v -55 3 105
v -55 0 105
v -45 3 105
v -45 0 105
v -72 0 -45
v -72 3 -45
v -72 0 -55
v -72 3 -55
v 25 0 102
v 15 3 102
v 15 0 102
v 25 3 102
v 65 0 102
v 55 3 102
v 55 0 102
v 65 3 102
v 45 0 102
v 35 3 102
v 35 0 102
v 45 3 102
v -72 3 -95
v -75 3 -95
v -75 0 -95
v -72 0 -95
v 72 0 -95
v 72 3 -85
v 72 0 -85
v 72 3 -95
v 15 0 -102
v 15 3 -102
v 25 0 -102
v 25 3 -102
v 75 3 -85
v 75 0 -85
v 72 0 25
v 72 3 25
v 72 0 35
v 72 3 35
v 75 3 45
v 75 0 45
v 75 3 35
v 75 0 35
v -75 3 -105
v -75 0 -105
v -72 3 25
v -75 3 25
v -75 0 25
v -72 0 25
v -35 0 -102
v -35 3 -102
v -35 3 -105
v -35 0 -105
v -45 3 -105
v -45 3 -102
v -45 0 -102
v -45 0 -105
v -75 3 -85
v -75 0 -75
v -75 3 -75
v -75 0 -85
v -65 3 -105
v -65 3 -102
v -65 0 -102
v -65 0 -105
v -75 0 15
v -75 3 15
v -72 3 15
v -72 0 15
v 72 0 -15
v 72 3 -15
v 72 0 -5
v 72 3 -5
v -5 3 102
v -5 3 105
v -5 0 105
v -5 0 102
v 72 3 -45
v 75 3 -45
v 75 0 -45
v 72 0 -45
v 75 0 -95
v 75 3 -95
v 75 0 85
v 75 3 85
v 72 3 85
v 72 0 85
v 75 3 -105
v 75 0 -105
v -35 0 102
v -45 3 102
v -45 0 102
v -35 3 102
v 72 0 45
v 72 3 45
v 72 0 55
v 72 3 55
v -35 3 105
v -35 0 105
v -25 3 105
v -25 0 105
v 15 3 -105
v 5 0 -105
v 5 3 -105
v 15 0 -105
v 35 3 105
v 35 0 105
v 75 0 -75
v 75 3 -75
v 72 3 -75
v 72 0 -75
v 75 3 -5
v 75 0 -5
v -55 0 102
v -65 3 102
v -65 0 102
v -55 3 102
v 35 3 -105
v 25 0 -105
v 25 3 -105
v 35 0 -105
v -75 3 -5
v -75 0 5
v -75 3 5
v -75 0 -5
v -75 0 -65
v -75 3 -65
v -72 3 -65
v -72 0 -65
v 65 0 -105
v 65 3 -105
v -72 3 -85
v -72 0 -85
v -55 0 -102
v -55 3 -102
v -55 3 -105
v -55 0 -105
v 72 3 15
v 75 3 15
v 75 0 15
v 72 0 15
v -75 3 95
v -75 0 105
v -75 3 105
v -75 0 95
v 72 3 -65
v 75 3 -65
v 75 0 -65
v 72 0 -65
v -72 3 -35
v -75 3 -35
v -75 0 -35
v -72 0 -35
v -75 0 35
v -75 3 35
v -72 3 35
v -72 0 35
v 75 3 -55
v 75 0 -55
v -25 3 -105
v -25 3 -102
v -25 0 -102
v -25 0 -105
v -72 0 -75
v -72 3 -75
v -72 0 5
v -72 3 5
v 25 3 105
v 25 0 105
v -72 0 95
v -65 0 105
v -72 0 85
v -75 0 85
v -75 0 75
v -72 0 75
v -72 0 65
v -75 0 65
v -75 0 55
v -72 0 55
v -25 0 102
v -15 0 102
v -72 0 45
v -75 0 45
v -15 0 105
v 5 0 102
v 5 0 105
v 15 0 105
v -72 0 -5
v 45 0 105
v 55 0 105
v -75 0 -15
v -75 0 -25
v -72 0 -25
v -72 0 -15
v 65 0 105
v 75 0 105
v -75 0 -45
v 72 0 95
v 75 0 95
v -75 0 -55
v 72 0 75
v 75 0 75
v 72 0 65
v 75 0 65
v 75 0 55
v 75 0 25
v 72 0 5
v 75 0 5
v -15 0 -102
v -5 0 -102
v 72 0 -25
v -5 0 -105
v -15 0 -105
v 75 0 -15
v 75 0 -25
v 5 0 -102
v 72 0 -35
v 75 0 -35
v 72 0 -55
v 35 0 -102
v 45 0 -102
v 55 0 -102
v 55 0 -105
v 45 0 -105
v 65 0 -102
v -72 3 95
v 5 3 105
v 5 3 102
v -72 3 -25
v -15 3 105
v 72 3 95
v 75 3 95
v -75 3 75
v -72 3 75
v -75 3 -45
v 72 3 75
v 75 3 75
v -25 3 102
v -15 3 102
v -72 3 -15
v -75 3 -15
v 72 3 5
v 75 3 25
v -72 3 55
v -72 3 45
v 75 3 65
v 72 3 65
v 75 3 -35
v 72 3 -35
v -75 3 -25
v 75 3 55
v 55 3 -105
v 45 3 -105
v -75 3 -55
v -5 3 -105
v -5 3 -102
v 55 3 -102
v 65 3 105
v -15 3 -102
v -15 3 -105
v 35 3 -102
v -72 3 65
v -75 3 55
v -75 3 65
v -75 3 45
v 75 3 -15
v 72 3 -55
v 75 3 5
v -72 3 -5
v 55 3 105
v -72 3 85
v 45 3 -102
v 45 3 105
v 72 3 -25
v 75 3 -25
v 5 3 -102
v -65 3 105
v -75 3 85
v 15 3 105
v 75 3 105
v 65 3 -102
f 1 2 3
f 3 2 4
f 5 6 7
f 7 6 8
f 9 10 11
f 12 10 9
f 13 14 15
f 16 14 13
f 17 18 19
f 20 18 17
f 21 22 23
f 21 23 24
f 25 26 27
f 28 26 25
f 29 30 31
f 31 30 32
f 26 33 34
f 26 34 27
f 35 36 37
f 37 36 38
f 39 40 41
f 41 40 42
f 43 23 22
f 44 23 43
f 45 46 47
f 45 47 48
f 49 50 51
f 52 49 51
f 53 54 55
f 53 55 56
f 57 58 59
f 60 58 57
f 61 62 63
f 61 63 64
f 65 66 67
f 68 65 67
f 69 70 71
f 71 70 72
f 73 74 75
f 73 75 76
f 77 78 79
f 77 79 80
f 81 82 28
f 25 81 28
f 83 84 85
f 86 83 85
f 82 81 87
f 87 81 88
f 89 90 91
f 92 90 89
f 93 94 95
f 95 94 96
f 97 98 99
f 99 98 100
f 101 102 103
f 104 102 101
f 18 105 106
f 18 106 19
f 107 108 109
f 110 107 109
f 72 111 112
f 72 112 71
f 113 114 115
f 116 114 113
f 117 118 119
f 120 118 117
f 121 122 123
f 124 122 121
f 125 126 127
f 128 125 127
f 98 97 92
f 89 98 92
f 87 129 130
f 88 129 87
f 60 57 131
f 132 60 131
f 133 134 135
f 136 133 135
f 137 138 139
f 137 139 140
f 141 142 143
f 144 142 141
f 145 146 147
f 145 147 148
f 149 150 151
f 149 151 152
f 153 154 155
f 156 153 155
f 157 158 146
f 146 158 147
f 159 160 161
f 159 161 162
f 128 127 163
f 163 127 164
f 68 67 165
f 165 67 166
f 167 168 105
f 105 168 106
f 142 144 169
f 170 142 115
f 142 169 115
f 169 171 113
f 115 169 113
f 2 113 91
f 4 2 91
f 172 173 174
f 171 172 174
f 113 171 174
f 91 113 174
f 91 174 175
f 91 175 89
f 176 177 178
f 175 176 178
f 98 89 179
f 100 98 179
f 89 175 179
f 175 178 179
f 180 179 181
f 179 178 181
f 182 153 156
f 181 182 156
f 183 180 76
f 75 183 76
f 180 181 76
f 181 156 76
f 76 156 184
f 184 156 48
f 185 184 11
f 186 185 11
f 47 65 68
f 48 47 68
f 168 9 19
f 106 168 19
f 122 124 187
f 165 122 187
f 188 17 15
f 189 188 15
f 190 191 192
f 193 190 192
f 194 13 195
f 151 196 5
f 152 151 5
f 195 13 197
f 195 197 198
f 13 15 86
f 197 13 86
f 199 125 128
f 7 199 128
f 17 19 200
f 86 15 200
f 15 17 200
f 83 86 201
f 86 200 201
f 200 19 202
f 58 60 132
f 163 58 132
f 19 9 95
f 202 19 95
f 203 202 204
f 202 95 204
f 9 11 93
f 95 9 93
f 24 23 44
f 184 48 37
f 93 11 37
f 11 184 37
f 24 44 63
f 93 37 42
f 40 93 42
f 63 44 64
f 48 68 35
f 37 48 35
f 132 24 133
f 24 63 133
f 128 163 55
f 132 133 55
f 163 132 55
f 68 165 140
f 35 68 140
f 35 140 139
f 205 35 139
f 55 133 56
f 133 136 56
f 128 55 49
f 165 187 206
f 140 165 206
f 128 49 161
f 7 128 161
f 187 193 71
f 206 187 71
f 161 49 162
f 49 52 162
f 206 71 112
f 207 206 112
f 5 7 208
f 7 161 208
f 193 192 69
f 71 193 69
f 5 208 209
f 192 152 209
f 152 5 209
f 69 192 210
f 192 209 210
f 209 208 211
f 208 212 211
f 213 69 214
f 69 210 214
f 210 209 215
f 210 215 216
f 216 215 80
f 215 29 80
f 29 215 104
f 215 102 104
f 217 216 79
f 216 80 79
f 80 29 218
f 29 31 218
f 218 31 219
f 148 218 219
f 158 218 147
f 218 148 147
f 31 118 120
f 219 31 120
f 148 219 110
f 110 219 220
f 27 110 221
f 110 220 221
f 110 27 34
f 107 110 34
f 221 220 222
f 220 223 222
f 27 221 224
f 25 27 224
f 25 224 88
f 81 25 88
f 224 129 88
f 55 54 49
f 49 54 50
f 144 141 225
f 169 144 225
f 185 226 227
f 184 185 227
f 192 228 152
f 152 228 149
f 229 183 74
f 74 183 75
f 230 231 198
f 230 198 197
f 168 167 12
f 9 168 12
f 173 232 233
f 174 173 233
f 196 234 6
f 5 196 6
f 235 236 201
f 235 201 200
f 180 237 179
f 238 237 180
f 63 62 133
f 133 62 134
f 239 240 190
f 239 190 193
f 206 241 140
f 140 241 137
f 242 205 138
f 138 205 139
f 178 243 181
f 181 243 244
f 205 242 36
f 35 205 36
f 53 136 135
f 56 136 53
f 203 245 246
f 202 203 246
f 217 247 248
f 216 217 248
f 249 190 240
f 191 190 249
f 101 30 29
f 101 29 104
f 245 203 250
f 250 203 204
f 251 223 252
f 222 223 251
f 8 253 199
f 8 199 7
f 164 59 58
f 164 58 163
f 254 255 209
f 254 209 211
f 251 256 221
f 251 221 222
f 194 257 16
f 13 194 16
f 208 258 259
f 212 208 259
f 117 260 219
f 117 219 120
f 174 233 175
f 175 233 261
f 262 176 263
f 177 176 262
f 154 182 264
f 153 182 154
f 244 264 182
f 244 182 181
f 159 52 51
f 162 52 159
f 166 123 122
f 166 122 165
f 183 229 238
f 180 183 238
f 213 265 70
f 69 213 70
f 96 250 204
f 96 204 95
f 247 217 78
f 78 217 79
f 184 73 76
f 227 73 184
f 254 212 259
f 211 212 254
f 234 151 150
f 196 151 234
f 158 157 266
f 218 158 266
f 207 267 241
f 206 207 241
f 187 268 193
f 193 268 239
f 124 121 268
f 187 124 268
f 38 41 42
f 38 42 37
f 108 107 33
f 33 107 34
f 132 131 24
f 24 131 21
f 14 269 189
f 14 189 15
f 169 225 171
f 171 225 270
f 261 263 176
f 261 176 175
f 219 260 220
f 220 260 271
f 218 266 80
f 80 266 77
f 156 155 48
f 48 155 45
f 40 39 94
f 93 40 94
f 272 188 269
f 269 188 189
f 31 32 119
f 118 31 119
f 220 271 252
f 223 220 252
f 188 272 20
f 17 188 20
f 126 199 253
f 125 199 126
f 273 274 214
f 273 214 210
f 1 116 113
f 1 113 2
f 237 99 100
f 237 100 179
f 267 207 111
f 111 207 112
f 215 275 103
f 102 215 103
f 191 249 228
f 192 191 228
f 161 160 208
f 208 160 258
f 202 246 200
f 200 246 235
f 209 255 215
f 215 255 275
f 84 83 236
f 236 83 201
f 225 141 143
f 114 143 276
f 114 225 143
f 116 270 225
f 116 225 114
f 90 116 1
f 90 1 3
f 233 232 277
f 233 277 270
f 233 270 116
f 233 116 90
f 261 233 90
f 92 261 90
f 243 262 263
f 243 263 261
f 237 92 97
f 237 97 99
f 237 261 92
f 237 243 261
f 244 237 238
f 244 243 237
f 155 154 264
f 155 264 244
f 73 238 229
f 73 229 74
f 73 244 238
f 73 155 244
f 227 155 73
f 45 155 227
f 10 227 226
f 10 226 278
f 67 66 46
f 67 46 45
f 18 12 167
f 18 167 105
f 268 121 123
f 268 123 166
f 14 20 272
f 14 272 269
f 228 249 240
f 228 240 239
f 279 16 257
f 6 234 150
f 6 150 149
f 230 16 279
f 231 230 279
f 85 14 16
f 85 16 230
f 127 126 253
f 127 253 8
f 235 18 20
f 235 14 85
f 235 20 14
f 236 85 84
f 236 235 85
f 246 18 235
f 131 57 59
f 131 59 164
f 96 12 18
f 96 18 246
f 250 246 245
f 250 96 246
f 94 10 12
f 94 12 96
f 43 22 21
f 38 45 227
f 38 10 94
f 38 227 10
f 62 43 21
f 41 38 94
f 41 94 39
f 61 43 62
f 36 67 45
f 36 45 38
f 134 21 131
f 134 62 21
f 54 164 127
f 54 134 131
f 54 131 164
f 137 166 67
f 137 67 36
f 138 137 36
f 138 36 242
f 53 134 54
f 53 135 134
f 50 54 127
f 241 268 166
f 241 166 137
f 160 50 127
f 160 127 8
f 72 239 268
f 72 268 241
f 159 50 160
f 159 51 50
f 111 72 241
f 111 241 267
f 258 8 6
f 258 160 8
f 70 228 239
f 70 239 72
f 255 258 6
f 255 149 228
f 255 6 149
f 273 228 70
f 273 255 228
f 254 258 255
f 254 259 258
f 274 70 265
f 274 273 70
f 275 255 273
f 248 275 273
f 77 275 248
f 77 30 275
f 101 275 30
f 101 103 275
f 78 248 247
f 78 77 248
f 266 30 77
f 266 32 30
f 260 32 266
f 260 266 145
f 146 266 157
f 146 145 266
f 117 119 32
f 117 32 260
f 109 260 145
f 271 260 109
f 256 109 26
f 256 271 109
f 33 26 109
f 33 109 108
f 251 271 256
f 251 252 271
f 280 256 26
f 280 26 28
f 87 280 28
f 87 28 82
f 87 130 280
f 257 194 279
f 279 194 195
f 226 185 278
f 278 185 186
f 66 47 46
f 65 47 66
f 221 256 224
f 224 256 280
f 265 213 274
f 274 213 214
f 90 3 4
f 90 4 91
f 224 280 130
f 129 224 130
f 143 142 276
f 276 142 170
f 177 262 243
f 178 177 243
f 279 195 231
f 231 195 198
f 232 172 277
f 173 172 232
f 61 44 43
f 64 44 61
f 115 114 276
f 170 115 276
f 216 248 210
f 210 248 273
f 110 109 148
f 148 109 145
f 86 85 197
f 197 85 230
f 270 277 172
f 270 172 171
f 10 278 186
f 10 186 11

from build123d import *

# Parameters (mm, degrees)
SKETCH1_W               = 150
SKETCH1_H               = 210
BOSS_EXTRUDE1_DEPTH     = 3
SKETCH2_W               = 10
SKETCH2_H               = 3
CUT_EXTRUDE1_DEPTH      = 3
LPATTERN1_COUNT         = 7
LPATTERN1_PITCH         = 20
MIRROR1_COPY_1_SKETCH_W = 10
MIRROR1_COPY_1_SKETCH_H = 3
MIRROR1_COPY_1_DEPTH    = 3
MIRROR1_COPY_2_SKETCH_W = 10
MIRROR1_COPY_2_SKETCH_H = 3
MIRROR1_COPY_2_DEPTH    = 3
MIRROR1_COPY_3_SKETCH_W = 10
MIRROR1_COPY_3_SKETCH_H = 3
MIRROR1_COPY_3_DEPTH    = 3
MIRROR1_COPY_4_SKETCH_W = 10
MIRROR1_COPY_4_SKETCH_H = 3
MIRROR1_COPY_4_DEPTH    = 3
MIRROR1_COPY_5_SKETCH_W = 10
MIRROR1_COPY_5_SKETCH_H = 3
MIRROR1_COPY_5_DEPTH    = 3
MIRROR1_COPY_6_SKETCH_W = 10
MIRROR1_COPY_6_SKETCH_H = 3
MIRROR1_COPY_6_DEPTH    = 3
SKETCH4_W               = 3
SKETCH4_H               = 10
CUT_EXTRUDE2_DEPTH      = 3
LPATTERN2_COUNT         = 10
LPATTERN2_PITCH         = 20
MIRROR2_COPY_1_SKETCH_W = 3
MIRROR2_COPY_1_SKETCH_H = 10
MIRROR2_COPY_1_DEPTH    = 3
MIRROR2_COPY_2_SKETCH_W = 3
MIRROR2_COPY_2_SKETCH_H = 10
MIRROR2_COPY_2_DEPTH    = 3
MIRROR2_COPY_3_SKETCH_W = 3
MIRROR2_COPY_3_SKETCH_H = 10
MIRROR2_COPY_3_DEPTH    = 3
MIRROR2_COPY_4_SKETCH_W = 3
MIRROR2_COPY_4_SKETCH_H = 10
MIRROR2_COPY_4_DEPTH    = 3
MIRROR2_COPY_5_SKETCH_W = 3
MIRROR2_COPY_5_SKETCH_H = 10
MIRROR2_COPY_5_DEPTH    = 3
MIRROR2_COPY_6_SKETCH_W = 3
MIRROR2_COPY_6_SKETCH_H = 10
MIRROR2_COPY_6_DEPTH    = 3
MIRROR2_COPY_7_SKETCH_W = 3
MIRROR2_COPY_7_SKETCH_H = 10
MIRROR2_COPY_7_DEPTH    = 3
MIRROR2_COPY_8_SKETCH_W = 3
MIRROR2_COPY_8_SKETCH_H = 10
MIRROR2_COPY_8_DEPTH    = 3
MIRROR2_COPY_9_SKETCH_W = 3
MIRROR2_COPY_9_SKETCH_H = 10
MIRROR2_COPY_9_DEPTH    = 3


with BuildPart() as part:
    # Sketch1 → Boss-Extrude1 (new body)
    with BuildSketch(Plane(origin=(0, 0, 0), x_dir=(1, 0, 0), z_dir=(0, 1, 0))):
        Rectangle(SKETCH1_W, SKETCH1_H)
    extrude(amount=BOSS_EXTRUDE1_DEPTH)

    # Sketch2 → Cut-Extrude1 (cut)
    with BuildSketch(Plane(origin=(0, 3, 0), x_dir=(1, 0, 0), z_dir=(0, 1, 0))):
        with Locations((-60, 103.5)):
            Rectangle(SKETCH2_W, SKETCH2_H)
    cut_extrude1 = extrude(amount=-CUT_EXTRUDE1_DEPTH, mode=Mode.SUBTRACT)

    # LPattern1: Cut-Extrude1 ×7
    with Locations(*[(i * LPATTERN1_PITCH, 0, 0) for i in range(1, LPATTERN1_COUNT)]):
        add(cut_extrude1, mode=Mode.SUBTRACT)

    # Mirror1: Cut-Extrude1 across plane
    add(cut_extrude1.mirror(Plane.XY), mode=Mode.SUBTRACT)

    # Mirror1 copy 1 sketch → Mirror1 copy 1 (cut)
    with BuildSketch(Plane(origin=(20, 3, 0), x_dir=(1, 0, 0), z_dir=(0, 1, 0))):
        with Locations((-60, -103.5)):
            Rectangle(MIRROR1_COPY_1_SKETCH_W, MIRROR1_COPY_1_SKETCH_H)
    extrude(amount=-MIRROR1_COPY_1_DEPTH, mode=Mode.SUBTRACT)

    # Mirror1 copy 2 sketch → Mirror1 copy 2 (cut)
    with BuildSketch(Plane(origin=(40, 3, 0), x_dir=(1, 0, 0), z_dir=(0, 1, 0))):
        with Locations((-60, -103.5)):
            Rectangle(MIRROR1_COPY_2_SKETCH_W, MIRROR1_COPY_2_SKETCH_H)
    extrude(amount=-MIRROR1_COPY_2_DEPTH, mode=Mode.SUBTRACT)

    # Mirror1 copy 3 sketch → Mirror1 copy 3 (cut)
    with BuildSketch(Plane(origin=(60, 3, 0), x_dir=(1, 0, 0), z_dir=(0, 1, 0))):
        with Locations((-60, -103.5)):
            Rectangle(MIRROR1_COPY_3_SKETCH_W, MIRROR1_COPY_3_SKETCH_H)
    extrude(amount=-MIRROR1_COPY_3_DEPTH, mode=Mode.SUBTRACT)

    # Mirror1 copy 4 sketch → Mirror1 copy 4 (cut)
    with BuildSketch(Plane(origin=(80, 3, 0), x_dir=(1, 0, 0), z_dir=(0, 1, 0))):
        with Locations((-60, -103.5)):
            Rectangle(MIRROR1_COPY_4_SKETCH_W, MIRROR1_COPY_4_SKETCH_H)
    extrude(amount=-MIRROR1_COPY_4_DEPTH, mode=Mode.SUBTRACT)

    # Mirror1 copy 5 sketch → Mirror1 copy 5 (cut)
    with BuildSketch(Plane(origin=(100, 3, 0), x_dir=(1, 0, 0), z_dir=(0, 1, 0))):
        with Locations((-60, -103.5)):
            Rectangle(MIRROR1_COPY_5_SKETCH_W, MIRROR1_COPY_5_SKETCH_H)
    extrude(amount=-MIRROR1_COPY_5_DEPTH, mode=Mode.SUBTRACT)

    # Mirror1 copy 6 sketch → Mirror1 copy 6 (cut)
    with BuildSketch(Plane(origin=(120, 3, 0), x_dir=(1, 0, 0), z_dir=(0, 1, 0))):
        with Locations((-60, -103.5)):
            Rectangle(MIRROR1_COPY_6_SKETCH_W, MIRROR1_COPY_6_SKETCH_H)
    extrude(amount=-MIRROR1_COPY_6_DEPTH, mode=Mode.SUBTRACT)

    # Sketch4 → Cut-Extrude2 (cut)
    with BuildSketch(Plane(origin=(0, 3, 0), x_dir=(1, 0, 0), z_dir=(0, 1, 0))):
        with Locations((-73.5, 90)):
            Rectangle(SKETCH4_W, SKETCH4_H)
    cut_extrude2 = extrude(amount=-CUT_EXTRUDE2_DEPTH, mode=Mode.SUBTRACT)

    # LPattern2: Cut-Extrude2 ×10
    with Locations(*[(0, 0, i * LPATTERN2_PITCH) for i in range(1, LPATTERN2_COUNT)]):
        add(cut_extrude2, mode=Mode.SUBTRACT)

    # Mirror2: Cut-Extrude2 across plane
    add(cut_extrude2.mirror(Plane(origin=(0, 0, 0), x_dir=(0, 0, 1), z_dir=(1, 0, 0))), mode=Mode.SUBTRACT)

    # Mirror2 copy 1 sketch → Mirror2 copy 1 (cut)
    with BuildSketch(Plane(origin=(0, 3, 20), x_dir=(-1, 0, 0), z_dir=(0, 1, 0))):
        with Locations((-73.5, -90)):
            Rectangle(MIRROR2_COPY_1_SKETCH_W, MIRROR2_COPY_1_SKETCH_H)
    extrude(amount=-MIRROR2_COPY_1_DEPTH, mode=Mode.SUBTRACT)

    # Mirror2 copy 2 sketch → Mirror2 copy 2 (cut)
    with BuildSketch(Plane(origin=(0, 3, 40), x_dir=(-1, 0, 0), z_dir=(0, 1, 0))):
        with Locations((-73.5, -90)):
            Rectangle(MIRROR2_COPY_2_SKETCH_W, MIRROR2_COPY_2_SKETCH_H)
    extrude(amount=-MIRROR2_COPY_2_DEPTH, mode=Mode.SUBTRACT)

    # Mirror2 copy 3 sketch → Mirror2 copy 3 (cut)
    with BuildSketch(Plane(origin=(0, 3, 60), x_dir=(-1, 0, 0), z_dir=(0, 1, 0))):
        with Locations((-73.5, -90)):
            Rectangle(MIRROR2_COPY_3_SKETCH_W, MIRROR2_COPY_3_SKETCH_H)
    extrude(amount=-MIRROR2_COPY_3_DEPTH, mode=Mode.SUBTRACT)

    # Mirror2 copy 4 sketch → Mirror2 copy 4 (cut)
    with BuildSketch(Plane(origin=(0, 3, 80), x_dir=(-1, 0, 0), z_dir=(0, 1, 0))):
        with Locations((-73.5, -90)):
            Rectangle(MIRROR2_COPY_4_SKETCH_W, MIRROR2_COPY_4_SKETCH_H)
    extrude(amount=-MIRROR2_COPY_4_DEPTH, mode=Mode.SUBTRACT)

    # Mirror2 copy 5 sketch → Mirror2 copy 5 (cut)
    with BuildSketch(Plane(origin=(0, 3, 100), x_dir=(-1, 0, 0), z_dir=(0, 1, 0))):
        with Locations((-73.5, -90)):
            Rectangle(MIRROR2_COPY_5_SKETCH_W, MIRROR2_COPY_5_SKETCH_H)
    extrude(amount=-MIRROR2_COPY_5_DEPTH, mode=Mode.SUBTRACT)

    # Mirror2 copy 6 sketch → Mirror2 copy 6 (cut)
    with BuildSketch(Plane(origin=(0, 3, 120), x_dir=(-1, 0, 0), z_dir=(0, 1, 0))):
        with Locations((-73.5, -90)):
            Rectangle(MIRROR2_COPY_6_SKETCH_W, MIRROR2_COPY_6_SKETCH_H)
    extrude(amount=-MIRROR2_COPY_6_DEPTH, mode=Mode.SUBTRACT)

    # Mirror2 copy 7 sketch → Mirror2 copy 7 (cut)
    with BuildSketch(Plane(origin=(0, 3, 140), x_dir=(-1, 0, 0), z_dir=(0, 1, 0))):
        with Locations((-73.5, -90)):
            Rectangle(MIRROR2_COPY_7_SKETCH_W, MIRROR2_COPY_7_SKETCH_H)
    extrude(amount=-MIRROR2_COPY_7_DEPTH, mode=Mode.SUBTRACT)

    # Mirror2 copy 8 sketch → Mirror2 copy 8 (cut)
    with BuildSketch(Plane(origin=(0, 3, 160), x_dir=(-1, 0, 0), z_dir=(0, 1, 0))):
        with Locations((-73.5, -90)):
            Rectangle(MIRROR2_COPY_8_SKETCH_W, MIRROR2_COPY_8_SKETCH_H)
    extrude(amount=-MIRROR2_COPY_8_DEPTH, mode=Mode.SUBTRACT)

    # Mirror2 copy 9 sketch → Mirror2 copy 9 (cut)
    with BuildSketch(Plane(origin=(0, 3, 180), x_dir=(-1, 0, 0), z_dir=(0, 1, 0))):
        with Locations((-73.5, -90)):
            Rectangle(MIRROR2_COPY_9_SKETCH_W, MIRROR2_COPY_9_SKETCH_H)
    extrude(amount=-MIRROR2_COPY_9_DEPTH, mode=Mode.SUBTRACT)


solid = part.part
